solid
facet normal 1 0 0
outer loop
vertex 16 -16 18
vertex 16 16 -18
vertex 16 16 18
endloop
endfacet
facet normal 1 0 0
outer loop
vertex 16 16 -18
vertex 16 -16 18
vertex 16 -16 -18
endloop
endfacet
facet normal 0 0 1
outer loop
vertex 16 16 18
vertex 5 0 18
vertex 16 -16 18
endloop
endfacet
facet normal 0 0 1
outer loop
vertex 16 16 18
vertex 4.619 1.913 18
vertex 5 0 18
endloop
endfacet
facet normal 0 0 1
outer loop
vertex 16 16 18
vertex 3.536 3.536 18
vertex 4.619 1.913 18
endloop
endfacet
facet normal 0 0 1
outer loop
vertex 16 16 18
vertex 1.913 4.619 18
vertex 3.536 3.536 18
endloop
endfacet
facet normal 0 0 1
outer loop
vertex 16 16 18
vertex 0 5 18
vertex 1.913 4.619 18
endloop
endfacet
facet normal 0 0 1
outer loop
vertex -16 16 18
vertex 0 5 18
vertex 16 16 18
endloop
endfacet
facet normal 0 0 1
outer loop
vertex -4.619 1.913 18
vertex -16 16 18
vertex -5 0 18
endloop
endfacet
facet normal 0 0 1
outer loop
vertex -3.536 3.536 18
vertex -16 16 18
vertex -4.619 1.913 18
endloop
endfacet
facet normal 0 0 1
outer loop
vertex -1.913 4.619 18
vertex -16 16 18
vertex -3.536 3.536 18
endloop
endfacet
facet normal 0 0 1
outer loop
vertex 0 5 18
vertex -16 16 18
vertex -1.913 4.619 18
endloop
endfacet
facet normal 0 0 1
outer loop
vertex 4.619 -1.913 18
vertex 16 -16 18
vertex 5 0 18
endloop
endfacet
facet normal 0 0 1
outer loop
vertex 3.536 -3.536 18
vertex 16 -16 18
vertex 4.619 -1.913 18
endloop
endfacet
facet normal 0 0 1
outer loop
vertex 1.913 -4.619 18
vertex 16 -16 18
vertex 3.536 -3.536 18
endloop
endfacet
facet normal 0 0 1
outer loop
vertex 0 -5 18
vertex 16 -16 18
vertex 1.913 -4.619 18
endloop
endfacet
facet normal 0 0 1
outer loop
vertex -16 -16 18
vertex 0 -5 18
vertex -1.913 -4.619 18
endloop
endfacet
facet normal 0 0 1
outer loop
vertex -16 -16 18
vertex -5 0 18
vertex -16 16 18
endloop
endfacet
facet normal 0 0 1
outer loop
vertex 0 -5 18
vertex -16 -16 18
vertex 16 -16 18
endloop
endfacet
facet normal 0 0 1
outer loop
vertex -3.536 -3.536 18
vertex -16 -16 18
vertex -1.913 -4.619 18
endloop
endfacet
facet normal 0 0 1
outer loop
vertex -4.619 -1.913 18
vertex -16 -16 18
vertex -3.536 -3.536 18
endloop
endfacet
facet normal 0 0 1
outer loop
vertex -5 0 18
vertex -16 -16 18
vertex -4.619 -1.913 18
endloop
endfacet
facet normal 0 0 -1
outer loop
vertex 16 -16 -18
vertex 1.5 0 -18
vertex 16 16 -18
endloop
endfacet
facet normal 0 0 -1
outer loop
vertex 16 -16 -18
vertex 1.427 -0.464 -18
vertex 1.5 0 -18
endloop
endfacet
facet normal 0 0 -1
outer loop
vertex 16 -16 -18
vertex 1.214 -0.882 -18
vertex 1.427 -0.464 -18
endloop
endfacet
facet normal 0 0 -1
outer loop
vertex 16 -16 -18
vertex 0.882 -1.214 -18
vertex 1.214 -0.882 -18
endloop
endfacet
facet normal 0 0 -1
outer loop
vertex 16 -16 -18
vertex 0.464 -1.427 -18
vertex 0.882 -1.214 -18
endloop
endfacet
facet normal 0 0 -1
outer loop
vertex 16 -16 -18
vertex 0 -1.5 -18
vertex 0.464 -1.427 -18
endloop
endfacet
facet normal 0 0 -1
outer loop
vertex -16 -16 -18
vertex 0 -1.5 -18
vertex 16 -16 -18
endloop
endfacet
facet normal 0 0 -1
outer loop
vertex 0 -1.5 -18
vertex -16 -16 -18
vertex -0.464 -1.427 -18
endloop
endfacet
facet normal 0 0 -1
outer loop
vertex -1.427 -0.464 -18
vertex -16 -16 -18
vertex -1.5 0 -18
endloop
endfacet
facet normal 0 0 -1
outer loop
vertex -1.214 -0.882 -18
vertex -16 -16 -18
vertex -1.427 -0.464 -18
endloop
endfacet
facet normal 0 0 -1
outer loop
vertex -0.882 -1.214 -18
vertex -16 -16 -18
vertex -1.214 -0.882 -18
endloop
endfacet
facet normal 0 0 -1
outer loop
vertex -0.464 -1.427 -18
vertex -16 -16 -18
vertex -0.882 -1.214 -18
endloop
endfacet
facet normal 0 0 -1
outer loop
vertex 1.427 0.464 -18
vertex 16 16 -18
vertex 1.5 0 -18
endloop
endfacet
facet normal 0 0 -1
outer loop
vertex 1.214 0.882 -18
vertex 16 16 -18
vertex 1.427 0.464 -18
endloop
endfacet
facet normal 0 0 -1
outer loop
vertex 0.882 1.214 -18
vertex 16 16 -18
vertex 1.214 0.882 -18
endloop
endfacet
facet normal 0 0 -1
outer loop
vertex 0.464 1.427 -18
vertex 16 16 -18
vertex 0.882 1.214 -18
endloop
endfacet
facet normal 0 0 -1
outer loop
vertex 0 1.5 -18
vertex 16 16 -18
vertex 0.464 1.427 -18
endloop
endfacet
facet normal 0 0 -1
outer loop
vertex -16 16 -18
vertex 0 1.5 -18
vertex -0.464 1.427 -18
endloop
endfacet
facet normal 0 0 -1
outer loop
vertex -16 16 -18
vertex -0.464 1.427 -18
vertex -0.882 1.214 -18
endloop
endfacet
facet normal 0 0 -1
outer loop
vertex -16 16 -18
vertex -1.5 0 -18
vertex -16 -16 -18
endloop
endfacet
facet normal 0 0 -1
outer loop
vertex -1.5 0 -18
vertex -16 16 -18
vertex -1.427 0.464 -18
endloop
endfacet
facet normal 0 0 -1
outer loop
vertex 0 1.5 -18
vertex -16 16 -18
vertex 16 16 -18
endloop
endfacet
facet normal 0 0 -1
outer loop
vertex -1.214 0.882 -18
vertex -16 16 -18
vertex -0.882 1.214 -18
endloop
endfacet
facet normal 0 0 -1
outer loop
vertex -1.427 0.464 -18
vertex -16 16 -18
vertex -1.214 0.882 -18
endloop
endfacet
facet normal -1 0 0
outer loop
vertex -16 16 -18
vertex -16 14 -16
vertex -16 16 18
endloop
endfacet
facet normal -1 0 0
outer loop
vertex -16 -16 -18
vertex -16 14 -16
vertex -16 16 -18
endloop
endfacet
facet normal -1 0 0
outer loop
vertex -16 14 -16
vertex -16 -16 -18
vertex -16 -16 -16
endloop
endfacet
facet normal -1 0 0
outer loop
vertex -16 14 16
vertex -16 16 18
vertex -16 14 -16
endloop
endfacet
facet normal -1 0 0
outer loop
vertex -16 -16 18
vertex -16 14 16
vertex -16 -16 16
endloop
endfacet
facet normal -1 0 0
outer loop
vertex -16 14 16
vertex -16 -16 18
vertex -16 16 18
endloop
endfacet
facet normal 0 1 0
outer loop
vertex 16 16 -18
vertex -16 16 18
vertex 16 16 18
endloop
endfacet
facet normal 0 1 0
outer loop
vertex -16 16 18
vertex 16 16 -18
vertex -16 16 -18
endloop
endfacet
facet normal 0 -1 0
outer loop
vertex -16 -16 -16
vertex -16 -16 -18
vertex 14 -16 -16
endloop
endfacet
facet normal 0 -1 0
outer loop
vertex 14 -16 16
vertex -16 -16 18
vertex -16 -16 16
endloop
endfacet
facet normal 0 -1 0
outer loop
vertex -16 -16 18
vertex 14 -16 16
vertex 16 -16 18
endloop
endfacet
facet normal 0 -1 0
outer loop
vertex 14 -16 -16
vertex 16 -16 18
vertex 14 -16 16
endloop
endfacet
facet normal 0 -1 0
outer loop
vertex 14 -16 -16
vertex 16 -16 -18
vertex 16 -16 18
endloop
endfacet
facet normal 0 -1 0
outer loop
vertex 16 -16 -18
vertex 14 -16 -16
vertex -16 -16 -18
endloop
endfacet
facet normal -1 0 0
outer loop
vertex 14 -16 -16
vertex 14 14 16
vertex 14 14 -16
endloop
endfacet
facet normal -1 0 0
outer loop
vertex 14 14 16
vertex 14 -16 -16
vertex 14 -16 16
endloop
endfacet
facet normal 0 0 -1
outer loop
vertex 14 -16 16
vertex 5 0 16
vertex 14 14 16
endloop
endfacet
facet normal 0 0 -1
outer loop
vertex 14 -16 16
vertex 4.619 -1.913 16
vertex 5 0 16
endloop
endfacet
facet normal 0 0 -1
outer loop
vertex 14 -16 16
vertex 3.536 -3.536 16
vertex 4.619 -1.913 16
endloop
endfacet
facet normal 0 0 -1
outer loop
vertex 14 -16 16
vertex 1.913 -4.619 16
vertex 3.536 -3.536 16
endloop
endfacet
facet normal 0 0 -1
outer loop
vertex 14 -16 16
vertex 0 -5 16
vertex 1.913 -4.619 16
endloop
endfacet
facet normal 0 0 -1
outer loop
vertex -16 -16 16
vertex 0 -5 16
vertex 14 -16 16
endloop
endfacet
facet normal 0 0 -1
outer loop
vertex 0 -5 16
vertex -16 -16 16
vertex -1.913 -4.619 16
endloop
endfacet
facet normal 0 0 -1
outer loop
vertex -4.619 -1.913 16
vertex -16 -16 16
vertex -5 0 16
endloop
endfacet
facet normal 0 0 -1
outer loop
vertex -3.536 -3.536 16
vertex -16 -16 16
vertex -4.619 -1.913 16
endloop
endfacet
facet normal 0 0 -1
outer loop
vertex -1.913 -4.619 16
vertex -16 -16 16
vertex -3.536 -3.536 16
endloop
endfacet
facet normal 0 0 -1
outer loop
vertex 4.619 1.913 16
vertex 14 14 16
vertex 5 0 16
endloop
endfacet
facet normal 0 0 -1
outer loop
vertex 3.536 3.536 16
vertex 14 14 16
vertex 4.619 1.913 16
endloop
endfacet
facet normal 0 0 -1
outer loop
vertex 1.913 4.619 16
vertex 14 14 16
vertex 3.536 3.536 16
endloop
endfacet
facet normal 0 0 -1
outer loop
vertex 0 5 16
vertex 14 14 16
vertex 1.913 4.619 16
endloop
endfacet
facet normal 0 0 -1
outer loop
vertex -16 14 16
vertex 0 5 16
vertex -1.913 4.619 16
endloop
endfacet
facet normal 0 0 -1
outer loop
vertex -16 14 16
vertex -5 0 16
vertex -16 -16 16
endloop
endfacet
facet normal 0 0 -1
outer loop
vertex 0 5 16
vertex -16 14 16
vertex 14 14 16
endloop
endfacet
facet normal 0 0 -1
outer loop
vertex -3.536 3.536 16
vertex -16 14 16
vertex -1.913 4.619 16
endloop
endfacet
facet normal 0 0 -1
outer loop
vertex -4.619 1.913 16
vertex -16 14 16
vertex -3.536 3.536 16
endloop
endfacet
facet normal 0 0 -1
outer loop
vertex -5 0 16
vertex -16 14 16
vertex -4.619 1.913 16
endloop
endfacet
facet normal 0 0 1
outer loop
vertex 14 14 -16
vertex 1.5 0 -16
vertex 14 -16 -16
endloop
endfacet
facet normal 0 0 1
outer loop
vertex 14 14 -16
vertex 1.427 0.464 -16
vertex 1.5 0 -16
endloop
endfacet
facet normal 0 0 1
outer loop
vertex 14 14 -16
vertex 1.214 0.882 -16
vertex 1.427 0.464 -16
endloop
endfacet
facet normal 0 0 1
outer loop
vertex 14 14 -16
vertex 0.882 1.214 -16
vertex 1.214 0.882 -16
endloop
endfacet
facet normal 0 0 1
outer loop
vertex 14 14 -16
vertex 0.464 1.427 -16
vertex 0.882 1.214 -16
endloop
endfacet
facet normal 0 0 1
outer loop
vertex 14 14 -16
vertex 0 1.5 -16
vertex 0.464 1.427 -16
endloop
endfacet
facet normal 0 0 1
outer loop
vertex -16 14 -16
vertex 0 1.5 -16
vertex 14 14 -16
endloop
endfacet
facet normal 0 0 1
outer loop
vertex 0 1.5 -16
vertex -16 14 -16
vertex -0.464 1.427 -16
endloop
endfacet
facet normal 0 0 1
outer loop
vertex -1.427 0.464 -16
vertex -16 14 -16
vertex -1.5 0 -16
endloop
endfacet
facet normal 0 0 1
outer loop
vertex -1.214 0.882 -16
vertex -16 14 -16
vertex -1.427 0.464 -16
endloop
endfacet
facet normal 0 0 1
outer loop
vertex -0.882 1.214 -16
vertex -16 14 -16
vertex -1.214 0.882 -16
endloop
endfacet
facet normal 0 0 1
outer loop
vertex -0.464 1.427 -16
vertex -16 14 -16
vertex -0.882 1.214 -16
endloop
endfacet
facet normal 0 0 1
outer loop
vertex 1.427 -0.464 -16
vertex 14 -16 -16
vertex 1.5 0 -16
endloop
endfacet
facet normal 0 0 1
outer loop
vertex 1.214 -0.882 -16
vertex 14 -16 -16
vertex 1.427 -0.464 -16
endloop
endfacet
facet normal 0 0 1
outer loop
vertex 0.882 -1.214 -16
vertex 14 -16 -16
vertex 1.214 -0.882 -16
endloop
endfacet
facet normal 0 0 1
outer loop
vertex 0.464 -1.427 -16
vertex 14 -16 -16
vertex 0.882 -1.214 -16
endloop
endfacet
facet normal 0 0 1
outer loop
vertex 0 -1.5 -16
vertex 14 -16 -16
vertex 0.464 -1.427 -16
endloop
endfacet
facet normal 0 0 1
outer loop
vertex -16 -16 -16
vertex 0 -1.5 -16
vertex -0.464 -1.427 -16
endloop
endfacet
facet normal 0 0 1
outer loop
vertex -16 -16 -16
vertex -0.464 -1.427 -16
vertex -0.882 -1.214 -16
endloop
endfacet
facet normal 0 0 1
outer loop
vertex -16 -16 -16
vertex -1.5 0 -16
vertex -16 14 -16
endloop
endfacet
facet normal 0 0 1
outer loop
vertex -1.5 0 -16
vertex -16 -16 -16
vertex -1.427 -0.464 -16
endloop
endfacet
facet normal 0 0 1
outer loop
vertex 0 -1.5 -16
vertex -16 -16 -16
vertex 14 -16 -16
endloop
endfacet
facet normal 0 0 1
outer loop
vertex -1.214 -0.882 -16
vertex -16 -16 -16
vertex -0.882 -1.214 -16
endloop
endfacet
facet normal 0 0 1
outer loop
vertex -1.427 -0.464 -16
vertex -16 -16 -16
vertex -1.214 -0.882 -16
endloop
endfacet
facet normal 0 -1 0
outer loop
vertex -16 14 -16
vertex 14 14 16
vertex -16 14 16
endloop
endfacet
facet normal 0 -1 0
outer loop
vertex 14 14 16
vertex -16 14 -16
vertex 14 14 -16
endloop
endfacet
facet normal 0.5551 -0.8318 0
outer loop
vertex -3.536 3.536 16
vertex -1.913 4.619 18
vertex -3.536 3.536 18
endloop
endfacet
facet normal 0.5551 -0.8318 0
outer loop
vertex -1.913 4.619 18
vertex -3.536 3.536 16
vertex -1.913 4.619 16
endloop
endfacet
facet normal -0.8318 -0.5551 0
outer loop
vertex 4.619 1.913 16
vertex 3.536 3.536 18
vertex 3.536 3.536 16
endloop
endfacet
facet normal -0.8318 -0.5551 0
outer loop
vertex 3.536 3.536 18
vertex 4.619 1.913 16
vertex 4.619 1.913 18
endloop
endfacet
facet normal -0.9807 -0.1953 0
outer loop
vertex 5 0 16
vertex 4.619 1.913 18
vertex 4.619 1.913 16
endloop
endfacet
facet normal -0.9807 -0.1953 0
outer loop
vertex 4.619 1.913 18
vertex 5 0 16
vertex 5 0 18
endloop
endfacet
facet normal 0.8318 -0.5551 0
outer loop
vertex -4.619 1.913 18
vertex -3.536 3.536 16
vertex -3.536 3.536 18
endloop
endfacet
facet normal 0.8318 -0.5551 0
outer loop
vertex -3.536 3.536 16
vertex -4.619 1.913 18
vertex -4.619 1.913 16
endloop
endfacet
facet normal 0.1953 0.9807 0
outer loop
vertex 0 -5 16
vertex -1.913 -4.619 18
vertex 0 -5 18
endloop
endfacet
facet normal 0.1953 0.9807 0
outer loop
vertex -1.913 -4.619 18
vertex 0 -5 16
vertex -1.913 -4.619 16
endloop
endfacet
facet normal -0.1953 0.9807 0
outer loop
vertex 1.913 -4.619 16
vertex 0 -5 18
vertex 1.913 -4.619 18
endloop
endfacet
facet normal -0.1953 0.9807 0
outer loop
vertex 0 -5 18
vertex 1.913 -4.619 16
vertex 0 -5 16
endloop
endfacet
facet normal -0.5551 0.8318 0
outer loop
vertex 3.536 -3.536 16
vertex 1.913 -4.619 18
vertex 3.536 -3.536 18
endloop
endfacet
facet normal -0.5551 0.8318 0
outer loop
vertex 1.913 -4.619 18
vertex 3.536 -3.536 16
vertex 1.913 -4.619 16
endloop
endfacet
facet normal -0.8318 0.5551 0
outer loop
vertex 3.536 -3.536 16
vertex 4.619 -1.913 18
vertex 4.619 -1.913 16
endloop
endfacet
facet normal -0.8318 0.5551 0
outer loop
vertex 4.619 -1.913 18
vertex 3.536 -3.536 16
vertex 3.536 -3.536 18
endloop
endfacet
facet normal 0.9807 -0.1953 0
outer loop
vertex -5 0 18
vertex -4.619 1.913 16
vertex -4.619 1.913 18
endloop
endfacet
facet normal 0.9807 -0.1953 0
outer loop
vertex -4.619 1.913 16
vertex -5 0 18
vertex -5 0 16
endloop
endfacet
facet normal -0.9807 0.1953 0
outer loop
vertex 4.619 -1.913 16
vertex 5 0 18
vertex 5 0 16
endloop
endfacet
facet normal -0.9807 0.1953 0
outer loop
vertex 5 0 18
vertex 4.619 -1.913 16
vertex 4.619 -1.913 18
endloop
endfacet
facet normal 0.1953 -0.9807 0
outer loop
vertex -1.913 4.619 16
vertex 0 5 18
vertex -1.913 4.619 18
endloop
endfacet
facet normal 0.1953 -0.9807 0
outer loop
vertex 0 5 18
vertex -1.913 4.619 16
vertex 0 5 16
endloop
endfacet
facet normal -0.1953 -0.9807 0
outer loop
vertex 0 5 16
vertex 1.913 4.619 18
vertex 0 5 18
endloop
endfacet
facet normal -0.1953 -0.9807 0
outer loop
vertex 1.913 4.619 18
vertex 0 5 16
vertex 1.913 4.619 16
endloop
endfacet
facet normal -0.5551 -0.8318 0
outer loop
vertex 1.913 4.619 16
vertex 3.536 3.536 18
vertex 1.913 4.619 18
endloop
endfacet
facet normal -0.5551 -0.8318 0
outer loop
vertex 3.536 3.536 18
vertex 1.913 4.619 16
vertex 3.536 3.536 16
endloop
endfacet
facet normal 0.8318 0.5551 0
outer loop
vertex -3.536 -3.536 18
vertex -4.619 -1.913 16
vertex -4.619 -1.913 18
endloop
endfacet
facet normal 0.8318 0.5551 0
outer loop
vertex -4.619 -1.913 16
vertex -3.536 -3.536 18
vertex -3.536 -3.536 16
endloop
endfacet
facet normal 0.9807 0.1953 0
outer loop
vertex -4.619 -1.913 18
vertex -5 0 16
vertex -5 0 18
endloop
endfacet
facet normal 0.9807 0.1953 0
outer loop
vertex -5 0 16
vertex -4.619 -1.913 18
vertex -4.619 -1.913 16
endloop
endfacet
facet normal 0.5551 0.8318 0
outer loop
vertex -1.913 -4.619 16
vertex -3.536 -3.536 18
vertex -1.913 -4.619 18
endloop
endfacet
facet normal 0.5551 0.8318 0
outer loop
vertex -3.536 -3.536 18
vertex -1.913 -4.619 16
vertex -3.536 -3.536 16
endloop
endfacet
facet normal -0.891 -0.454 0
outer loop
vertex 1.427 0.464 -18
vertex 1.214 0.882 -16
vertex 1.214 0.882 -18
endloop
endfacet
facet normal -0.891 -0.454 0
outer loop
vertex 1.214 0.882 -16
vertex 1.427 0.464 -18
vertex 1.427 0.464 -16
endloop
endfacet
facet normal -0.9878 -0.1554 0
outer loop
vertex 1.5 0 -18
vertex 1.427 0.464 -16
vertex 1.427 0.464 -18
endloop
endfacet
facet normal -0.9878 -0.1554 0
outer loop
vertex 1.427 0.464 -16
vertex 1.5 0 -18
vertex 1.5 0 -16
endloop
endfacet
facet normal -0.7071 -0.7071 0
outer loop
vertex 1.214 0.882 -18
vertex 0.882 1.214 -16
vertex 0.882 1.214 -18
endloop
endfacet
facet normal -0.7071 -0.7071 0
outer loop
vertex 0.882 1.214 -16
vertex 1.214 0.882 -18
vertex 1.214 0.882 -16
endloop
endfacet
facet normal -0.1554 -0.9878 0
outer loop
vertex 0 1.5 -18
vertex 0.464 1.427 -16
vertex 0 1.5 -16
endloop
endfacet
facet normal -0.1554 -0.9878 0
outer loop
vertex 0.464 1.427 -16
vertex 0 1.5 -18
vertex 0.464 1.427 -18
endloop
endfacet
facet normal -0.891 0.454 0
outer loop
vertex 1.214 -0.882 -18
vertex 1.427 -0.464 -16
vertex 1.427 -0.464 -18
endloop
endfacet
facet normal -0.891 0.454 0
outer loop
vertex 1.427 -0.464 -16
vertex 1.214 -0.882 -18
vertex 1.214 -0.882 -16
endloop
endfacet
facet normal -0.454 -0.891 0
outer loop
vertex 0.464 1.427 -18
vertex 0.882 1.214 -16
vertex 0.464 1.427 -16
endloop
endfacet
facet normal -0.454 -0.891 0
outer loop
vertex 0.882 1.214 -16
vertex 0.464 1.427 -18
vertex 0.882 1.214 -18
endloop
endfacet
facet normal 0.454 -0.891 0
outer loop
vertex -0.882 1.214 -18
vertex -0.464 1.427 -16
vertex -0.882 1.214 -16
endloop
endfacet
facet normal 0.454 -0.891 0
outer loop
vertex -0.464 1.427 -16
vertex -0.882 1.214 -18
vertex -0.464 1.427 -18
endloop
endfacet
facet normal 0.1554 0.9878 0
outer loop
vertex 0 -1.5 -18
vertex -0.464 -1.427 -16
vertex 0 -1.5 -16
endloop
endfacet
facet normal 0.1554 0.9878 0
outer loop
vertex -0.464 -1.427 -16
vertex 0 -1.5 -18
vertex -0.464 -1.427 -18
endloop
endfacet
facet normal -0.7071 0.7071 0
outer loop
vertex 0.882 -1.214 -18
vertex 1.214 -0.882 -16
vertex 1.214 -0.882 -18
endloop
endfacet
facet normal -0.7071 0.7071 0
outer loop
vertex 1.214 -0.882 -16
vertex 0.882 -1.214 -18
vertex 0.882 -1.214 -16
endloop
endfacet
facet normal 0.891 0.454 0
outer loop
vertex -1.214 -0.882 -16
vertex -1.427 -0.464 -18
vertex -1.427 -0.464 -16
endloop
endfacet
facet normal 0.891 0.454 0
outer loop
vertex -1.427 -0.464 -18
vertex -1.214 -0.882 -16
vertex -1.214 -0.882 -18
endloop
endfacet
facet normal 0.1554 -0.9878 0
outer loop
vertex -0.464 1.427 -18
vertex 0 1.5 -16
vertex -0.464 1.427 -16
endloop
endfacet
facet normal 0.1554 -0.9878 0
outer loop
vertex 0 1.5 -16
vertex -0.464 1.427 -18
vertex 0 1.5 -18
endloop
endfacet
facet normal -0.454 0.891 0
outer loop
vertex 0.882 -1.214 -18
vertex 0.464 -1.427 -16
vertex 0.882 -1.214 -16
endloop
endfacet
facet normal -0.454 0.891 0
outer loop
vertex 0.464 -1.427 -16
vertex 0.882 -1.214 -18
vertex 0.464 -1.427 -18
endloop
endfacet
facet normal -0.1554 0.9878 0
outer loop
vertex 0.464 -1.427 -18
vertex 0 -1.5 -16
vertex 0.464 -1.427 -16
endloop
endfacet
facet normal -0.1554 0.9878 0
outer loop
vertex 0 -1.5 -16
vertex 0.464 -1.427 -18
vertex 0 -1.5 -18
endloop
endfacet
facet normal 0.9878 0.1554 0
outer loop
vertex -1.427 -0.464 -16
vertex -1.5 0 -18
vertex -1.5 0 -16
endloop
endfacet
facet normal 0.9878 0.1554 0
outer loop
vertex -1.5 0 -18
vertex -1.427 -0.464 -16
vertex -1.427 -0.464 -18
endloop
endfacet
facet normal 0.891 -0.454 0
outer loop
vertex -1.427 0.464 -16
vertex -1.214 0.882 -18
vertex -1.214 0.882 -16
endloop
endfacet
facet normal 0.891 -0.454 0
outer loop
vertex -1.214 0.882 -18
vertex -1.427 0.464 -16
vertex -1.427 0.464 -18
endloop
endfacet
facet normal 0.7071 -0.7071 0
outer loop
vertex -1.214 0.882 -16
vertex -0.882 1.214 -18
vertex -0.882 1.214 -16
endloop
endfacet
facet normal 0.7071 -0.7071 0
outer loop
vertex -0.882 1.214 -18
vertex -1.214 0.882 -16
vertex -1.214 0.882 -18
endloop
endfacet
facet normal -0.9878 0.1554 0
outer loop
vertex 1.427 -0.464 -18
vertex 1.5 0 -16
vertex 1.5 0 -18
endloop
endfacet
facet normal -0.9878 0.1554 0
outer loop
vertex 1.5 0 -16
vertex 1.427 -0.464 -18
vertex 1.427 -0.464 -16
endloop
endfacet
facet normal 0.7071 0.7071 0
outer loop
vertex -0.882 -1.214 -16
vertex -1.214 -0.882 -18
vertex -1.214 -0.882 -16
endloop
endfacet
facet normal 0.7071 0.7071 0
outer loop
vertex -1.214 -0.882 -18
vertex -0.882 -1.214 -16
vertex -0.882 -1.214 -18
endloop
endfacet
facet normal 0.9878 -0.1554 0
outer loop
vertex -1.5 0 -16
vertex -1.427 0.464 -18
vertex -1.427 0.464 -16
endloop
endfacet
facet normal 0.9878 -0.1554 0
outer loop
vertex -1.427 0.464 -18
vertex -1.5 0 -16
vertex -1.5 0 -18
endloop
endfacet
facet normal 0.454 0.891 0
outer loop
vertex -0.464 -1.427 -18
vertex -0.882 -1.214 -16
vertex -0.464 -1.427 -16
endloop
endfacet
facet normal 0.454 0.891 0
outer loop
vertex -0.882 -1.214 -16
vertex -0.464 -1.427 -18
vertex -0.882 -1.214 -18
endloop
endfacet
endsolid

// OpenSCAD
difference() {
    cube([32,32,36], center=true);
    translate([-1,-1,0]) cube([30,30,32], center=true);
    translate([0,0,18]) cylinder(d=10, h=5, center=true);
    translate([0,0,-18]) cylinder(d=3, h=5, center=true, $fn=20);
}
